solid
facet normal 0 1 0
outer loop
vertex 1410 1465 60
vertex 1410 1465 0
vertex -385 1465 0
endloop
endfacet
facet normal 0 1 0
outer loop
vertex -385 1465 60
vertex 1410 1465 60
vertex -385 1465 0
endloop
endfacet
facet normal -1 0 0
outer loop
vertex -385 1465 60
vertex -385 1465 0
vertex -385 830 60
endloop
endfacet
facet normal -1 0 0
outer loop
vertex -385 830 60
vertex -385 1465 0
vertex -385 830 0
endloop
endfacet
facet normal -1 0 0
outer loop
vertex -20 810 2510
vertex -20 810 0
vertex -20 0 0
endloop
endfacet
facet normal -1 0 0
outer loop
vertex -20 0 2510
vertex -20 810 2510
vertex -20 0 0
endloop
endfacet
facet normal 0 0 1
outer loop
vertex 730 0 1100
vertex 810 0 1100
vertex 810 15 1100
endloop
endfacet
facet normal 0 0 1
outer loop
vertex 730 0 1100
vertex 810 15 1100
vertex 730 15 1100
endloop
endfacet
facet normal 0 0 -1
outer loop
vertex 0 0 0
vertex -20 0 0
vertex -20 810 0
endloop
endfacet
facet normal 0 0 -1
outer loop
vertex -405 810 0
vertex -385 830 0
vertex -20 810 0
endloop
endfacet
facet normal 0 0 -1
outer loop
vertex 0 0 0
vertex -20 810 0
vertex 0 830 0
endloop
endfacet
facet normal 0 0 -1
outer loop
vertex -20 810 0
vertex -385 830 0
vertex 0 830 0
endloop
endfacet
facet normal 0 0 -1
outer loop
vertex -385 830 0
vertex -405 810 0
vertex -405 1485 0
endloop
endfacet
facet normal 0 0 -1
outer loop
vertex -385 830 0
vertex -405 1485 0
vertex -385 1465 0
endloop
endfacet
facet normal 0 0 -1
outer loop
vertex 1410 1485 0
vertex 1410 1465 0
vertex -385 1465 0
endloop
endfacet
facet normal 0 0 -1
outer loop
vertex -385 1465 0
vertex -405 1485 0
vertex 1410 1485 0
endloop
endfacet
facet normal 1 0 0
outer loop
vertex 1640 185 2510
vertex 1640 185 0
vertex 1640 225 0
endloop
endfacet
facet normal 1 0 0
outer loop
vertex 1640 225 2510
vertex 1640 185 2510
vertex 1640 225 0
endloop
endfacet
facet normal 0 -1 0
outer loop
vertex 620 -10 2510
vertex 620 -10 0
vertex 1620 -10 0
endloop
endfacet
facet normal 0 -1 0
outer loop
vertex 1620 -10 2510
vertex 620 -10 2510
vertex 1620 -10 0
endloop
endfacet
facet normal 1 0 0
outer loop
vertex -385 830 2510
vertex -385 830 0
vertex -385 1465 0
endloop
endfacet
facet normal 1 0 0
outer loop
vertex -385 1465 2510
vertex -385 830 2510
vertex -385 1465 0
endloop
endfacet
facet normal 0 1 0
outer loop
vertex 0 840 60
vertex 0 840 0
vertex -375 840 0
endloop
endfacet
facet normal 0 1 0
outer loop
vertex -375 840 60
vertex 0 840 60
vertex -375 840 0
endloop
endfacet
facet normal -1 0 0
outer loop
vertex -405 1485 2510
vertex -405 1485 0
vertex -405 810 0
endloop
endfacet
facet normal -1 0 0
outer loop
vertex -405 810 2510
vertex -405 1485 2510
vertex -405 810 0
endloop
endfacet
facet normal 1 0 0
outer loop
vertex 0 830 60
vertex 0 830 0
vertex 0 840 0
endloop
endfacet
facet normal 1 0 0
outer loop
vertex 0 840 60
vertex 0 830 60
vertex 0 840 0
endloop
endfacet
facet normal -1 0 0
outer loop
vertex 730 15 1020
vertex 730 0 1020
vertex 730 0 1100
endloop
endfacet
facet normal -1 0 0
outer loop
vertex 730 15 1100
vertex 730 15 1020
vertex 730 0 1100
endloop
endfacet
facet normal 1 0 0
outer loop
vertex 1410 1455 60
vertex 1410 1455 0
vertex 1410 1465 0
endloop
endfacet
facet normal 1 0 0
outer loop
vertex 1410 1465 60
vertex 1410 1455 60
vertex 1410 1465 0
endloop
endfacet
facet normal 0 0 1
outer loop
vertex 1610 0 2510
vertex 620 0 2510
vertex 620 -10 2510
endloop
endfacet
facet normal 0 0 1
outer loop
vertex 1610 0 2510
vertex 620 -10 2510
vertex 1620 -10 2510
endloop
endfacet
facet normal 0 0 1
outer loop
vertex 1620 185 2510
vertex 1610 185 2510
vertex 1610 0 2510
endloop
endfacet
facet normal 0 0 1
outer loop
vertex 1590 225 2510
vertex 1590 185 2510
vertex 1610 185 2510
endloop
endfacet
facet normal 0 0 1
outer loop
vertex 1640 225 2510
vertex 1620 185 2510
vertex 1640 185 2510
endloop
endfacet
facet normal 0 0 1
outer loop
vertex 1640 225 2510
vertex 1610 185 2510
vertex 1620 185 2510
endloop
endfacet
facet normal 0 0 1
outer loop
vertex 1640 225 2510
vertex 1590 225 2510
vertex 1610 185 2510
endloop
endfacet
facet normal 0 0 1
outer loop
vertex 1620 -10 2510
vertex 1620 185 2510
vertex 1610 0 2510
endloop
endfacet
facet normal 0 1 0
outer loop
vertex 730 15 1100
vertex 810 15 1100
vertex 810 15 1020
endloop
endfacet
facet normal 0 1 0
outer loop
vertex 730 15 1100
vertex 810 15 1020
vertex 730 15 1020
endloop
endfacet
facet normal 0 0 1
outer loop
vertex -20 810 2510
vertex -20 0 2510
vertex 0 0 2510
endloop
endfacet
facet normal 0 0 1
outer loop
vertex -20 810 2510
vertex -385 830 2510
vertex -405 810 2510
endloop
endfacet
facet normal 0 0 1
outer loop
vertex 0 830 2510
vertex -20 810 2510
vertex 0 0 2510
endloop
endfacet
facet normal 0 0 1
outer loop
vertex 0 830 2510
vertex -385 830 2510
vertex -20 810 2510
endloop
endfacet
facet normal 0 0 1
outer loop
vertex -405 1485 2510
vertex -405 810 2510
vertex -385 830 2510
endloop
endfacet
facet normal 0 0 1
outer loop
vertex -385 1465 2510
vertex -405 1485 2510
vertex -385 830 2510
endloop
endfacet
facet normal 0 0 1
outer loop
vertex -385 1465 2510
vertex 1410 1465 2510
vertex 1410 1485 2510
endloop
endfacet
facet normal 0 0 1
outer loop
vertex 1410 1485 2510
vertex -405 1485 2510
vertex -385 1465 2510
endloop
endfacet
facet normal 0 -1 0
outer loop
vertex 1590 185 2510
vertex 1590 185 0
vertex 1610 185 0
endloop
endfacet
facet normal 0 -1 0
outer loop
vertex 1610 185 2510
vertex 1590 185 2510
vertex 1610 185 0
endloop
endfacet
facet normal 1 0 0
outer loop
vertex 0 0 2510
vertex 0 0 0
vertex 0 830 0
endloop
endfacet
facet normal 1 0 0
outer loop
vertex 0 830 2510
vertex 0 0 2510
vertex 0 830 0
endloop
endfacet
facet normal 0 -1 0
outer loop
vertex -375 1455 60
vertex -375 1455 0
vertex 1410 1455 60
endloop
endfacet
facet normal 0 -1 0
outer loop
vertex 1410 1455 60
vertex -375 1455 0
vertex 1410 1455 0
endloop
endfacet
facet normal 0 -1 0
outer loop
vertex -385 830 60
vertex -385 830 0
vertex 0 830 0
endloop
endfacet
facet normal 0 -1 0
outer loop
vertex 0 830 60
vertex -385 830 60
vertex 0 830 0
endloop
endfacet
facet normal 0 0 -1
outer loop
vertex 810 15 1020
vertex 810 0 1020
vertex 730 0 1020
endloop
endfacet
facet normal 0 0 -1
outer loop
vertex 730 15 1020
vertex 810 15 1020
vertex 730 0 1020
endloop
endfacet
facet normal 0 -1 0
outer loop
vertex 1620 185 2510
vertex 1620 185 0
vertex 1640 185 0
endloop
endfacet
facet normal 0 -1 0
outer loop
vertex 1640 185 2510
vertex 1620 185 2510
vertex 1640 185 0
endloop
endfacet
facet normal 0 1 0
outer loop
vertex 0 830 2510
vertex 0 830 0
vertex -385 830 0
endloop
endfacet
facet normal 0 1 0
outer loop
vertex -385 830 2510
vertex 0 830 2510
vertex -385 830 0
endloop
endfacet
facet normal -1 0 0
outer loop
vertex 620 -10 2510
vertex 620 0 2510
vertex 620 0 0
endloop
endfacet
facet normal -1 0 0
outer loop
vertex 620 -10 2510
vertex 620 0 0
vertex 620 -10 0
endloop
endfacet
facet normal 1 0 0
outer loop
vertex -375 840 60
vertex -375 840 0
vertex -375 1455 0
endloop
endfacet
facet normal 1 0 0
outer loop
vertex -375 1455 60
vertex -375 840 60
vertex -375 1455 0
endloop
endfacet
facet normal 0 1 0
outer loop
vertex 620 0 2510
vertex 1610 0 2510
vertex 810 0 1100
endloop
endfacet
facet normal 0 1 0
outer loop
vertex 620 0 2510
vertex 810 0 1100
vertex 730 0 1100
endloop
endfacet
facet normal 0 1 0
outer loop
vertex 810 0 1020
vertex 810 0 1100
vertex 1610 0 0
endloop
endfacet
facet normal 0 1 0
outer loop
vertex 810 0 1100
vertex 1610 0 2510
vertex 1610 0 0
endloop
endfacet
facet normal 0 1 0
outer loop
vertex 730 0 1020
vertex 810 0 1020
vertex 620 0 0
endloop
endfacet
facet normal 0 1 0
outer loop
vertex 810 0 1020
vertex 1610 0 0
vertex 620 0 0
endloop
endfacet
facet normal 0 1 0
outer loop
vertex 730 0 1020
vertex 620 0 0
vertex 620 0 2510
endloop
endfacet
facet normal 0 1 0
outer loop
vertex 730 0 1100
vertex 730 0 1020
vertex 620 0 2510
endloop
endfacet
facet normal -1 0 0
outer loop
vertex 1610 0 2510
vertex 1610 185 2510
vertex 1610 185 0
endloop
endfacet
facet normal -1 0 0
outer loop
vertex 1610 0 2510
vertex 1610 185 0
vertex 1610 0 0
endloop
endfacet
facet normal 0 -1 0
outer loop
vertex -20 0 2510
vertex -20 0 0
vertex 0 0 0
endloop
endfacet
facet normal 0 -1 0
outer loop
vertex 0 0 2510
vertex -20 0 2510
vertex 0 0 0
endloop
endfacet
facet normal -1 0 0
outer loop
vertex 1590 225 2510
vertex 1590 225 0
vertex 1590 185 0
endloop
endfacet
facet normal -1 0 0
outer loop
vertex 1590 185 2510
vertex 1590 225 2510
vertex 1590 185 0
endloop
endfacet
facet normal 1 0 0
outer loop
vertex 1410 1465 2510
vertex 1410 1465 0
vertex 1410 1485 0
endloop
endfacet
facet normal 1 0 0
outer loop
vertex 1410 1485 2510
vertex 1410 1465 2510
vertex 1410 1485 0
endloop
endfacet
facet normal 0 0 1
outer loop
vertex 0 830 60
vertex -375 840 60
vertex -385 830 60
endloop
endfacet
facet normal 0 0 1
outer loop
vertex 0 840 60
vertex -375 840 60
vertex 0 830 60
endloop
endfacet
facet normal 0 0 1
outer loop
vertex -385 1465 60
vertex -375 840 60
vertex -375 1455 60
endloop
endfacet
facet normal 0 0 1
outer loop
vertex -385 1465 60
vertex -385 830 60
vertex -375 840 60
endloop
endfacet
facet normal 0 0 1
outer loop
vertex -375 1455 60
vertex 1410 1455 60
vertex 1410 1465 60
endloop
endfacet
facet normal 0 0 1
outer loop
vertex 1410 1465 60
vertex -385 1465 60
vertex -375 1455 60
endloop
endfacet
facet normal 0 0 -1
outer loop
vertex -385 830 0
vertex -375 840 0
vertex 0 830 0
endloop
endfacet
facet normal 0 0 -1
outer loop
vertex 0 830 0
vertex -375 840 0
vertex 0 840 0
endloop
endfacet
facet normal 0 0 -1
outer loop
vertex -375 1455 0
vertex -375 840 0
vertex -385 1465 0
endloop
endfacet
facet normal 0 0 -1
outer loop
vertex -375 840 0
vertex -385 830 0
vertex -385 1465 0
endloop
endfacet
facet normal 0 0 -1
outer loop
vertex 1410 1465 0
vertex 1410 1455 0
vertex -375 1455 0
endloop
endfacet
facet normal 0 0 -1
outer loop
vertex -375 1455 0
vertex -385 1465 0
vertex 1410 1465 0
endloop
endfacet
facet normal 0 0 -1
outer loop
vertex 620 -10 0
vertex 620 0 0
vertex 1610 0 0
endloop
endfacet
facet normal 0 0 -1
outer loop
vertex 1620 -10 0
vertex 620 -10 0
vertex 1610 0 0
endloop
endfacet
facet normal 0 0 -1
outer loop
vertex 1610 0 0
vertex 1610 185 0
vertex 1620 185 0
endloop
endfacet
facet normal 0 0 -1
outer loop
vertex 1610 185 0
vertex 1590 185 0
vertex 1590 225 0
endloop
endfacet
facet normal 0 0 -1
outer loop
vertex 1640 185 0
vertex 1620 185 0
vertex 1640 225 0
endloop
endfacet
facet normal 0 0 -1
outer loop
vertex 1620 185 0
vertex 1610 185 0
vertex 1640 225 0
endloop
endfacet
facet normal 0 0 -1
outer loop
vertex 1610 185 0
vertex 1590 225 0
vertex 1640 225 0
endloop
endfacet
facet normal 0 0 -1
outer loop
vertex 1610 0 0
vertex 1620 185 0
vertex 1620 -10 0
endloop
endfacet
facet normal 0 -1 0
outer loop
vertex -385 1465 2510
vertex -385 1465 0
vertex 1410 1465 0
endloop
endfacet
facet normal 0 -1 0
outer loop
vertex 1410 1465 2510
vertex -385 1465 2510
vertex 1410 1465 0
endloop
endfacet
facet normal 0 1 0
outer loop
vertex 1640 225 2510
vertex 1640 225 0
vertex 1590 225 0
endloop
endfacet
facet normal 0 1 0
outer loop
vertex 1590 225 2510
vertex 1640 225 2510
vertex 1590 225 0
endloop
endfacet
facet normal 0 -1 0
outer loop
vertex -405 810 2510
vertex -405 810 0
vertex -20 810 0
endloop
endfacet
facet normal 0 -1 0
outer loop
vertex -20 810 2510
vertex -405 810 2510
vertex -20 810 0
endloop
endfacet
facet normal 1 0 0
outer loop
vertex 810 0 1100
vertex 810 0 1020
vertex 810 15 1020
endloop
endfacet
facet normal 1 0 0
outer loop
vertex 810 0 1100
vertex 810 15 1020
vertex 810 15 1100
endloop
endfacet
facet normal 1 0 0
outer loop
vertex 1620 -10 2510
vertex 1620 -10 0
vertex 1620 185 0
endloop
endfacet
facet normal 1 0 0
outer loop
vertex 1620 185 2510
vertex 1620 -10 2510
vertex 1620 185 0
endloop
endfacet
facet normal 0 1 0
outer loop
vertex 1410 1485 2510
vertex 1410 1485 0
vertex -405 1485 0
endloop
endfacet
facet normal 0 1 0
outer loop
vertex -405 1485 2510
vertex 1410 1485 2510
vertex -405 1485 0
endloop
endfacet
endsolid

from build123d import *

# Parameters (mm, degrees)
F1_DEPTH = 2510
F3_DEPTH = 60
F5_DEPTH = 2510
F6_W     = 80
F6_H     = 80
F7_DEPTH = 15


with BuildPart() as f1:
    # F0 (on Top) → F1 (new body)
    with BuildSketch(Plane.XY):
        Polygon((-20, 0), (0, 0), (0, 830), (-385, 830), (-385, 1465), (1410, 1465), (1410, 1485), (-405, 1485), (-405, 810), (-20, 810), align=None)
    extrude(amount=F1_DEPTH)


with BuildPart() as f3:
    # F2 (on Top) → F3 (new body)
    with BuildSketch(Plane.XY):
        Polygon((0, 830), (0, 840), (-375, 840), (-375, 1455), (1410, 1455), (1410, 1465), (-385, 1465), (-385, 830), align=None)
    extrude(amount=F3_DEPTH)


with BuildPart() as f5:
    # F4 (on Top) → F5 (new body, through all)
    with BuildSketch(Plane.XY):
        Polygon((1640, 225), (1590, 225), (1590, 185), (1610, 185), (1610, 0), (620, 0), (620, -10), (1620, -10), (1620, 185), (1640, 185), align=None)
    extrude(amount=F5_DEPTH)

    # F6 (on face) → F7 (join)
    with BuildSketch(Plane(origin=(0, 0, 0), x_dir=(-1, 0, 0), z_dir=(0, 1, 0))):
        with Locations((-770, 1060)):
            Rectangle(F6_W, F6_H)
    extrude(amount=F7_DEPTH)


solid = Compound([f1.part, f3.part, f5.part])
